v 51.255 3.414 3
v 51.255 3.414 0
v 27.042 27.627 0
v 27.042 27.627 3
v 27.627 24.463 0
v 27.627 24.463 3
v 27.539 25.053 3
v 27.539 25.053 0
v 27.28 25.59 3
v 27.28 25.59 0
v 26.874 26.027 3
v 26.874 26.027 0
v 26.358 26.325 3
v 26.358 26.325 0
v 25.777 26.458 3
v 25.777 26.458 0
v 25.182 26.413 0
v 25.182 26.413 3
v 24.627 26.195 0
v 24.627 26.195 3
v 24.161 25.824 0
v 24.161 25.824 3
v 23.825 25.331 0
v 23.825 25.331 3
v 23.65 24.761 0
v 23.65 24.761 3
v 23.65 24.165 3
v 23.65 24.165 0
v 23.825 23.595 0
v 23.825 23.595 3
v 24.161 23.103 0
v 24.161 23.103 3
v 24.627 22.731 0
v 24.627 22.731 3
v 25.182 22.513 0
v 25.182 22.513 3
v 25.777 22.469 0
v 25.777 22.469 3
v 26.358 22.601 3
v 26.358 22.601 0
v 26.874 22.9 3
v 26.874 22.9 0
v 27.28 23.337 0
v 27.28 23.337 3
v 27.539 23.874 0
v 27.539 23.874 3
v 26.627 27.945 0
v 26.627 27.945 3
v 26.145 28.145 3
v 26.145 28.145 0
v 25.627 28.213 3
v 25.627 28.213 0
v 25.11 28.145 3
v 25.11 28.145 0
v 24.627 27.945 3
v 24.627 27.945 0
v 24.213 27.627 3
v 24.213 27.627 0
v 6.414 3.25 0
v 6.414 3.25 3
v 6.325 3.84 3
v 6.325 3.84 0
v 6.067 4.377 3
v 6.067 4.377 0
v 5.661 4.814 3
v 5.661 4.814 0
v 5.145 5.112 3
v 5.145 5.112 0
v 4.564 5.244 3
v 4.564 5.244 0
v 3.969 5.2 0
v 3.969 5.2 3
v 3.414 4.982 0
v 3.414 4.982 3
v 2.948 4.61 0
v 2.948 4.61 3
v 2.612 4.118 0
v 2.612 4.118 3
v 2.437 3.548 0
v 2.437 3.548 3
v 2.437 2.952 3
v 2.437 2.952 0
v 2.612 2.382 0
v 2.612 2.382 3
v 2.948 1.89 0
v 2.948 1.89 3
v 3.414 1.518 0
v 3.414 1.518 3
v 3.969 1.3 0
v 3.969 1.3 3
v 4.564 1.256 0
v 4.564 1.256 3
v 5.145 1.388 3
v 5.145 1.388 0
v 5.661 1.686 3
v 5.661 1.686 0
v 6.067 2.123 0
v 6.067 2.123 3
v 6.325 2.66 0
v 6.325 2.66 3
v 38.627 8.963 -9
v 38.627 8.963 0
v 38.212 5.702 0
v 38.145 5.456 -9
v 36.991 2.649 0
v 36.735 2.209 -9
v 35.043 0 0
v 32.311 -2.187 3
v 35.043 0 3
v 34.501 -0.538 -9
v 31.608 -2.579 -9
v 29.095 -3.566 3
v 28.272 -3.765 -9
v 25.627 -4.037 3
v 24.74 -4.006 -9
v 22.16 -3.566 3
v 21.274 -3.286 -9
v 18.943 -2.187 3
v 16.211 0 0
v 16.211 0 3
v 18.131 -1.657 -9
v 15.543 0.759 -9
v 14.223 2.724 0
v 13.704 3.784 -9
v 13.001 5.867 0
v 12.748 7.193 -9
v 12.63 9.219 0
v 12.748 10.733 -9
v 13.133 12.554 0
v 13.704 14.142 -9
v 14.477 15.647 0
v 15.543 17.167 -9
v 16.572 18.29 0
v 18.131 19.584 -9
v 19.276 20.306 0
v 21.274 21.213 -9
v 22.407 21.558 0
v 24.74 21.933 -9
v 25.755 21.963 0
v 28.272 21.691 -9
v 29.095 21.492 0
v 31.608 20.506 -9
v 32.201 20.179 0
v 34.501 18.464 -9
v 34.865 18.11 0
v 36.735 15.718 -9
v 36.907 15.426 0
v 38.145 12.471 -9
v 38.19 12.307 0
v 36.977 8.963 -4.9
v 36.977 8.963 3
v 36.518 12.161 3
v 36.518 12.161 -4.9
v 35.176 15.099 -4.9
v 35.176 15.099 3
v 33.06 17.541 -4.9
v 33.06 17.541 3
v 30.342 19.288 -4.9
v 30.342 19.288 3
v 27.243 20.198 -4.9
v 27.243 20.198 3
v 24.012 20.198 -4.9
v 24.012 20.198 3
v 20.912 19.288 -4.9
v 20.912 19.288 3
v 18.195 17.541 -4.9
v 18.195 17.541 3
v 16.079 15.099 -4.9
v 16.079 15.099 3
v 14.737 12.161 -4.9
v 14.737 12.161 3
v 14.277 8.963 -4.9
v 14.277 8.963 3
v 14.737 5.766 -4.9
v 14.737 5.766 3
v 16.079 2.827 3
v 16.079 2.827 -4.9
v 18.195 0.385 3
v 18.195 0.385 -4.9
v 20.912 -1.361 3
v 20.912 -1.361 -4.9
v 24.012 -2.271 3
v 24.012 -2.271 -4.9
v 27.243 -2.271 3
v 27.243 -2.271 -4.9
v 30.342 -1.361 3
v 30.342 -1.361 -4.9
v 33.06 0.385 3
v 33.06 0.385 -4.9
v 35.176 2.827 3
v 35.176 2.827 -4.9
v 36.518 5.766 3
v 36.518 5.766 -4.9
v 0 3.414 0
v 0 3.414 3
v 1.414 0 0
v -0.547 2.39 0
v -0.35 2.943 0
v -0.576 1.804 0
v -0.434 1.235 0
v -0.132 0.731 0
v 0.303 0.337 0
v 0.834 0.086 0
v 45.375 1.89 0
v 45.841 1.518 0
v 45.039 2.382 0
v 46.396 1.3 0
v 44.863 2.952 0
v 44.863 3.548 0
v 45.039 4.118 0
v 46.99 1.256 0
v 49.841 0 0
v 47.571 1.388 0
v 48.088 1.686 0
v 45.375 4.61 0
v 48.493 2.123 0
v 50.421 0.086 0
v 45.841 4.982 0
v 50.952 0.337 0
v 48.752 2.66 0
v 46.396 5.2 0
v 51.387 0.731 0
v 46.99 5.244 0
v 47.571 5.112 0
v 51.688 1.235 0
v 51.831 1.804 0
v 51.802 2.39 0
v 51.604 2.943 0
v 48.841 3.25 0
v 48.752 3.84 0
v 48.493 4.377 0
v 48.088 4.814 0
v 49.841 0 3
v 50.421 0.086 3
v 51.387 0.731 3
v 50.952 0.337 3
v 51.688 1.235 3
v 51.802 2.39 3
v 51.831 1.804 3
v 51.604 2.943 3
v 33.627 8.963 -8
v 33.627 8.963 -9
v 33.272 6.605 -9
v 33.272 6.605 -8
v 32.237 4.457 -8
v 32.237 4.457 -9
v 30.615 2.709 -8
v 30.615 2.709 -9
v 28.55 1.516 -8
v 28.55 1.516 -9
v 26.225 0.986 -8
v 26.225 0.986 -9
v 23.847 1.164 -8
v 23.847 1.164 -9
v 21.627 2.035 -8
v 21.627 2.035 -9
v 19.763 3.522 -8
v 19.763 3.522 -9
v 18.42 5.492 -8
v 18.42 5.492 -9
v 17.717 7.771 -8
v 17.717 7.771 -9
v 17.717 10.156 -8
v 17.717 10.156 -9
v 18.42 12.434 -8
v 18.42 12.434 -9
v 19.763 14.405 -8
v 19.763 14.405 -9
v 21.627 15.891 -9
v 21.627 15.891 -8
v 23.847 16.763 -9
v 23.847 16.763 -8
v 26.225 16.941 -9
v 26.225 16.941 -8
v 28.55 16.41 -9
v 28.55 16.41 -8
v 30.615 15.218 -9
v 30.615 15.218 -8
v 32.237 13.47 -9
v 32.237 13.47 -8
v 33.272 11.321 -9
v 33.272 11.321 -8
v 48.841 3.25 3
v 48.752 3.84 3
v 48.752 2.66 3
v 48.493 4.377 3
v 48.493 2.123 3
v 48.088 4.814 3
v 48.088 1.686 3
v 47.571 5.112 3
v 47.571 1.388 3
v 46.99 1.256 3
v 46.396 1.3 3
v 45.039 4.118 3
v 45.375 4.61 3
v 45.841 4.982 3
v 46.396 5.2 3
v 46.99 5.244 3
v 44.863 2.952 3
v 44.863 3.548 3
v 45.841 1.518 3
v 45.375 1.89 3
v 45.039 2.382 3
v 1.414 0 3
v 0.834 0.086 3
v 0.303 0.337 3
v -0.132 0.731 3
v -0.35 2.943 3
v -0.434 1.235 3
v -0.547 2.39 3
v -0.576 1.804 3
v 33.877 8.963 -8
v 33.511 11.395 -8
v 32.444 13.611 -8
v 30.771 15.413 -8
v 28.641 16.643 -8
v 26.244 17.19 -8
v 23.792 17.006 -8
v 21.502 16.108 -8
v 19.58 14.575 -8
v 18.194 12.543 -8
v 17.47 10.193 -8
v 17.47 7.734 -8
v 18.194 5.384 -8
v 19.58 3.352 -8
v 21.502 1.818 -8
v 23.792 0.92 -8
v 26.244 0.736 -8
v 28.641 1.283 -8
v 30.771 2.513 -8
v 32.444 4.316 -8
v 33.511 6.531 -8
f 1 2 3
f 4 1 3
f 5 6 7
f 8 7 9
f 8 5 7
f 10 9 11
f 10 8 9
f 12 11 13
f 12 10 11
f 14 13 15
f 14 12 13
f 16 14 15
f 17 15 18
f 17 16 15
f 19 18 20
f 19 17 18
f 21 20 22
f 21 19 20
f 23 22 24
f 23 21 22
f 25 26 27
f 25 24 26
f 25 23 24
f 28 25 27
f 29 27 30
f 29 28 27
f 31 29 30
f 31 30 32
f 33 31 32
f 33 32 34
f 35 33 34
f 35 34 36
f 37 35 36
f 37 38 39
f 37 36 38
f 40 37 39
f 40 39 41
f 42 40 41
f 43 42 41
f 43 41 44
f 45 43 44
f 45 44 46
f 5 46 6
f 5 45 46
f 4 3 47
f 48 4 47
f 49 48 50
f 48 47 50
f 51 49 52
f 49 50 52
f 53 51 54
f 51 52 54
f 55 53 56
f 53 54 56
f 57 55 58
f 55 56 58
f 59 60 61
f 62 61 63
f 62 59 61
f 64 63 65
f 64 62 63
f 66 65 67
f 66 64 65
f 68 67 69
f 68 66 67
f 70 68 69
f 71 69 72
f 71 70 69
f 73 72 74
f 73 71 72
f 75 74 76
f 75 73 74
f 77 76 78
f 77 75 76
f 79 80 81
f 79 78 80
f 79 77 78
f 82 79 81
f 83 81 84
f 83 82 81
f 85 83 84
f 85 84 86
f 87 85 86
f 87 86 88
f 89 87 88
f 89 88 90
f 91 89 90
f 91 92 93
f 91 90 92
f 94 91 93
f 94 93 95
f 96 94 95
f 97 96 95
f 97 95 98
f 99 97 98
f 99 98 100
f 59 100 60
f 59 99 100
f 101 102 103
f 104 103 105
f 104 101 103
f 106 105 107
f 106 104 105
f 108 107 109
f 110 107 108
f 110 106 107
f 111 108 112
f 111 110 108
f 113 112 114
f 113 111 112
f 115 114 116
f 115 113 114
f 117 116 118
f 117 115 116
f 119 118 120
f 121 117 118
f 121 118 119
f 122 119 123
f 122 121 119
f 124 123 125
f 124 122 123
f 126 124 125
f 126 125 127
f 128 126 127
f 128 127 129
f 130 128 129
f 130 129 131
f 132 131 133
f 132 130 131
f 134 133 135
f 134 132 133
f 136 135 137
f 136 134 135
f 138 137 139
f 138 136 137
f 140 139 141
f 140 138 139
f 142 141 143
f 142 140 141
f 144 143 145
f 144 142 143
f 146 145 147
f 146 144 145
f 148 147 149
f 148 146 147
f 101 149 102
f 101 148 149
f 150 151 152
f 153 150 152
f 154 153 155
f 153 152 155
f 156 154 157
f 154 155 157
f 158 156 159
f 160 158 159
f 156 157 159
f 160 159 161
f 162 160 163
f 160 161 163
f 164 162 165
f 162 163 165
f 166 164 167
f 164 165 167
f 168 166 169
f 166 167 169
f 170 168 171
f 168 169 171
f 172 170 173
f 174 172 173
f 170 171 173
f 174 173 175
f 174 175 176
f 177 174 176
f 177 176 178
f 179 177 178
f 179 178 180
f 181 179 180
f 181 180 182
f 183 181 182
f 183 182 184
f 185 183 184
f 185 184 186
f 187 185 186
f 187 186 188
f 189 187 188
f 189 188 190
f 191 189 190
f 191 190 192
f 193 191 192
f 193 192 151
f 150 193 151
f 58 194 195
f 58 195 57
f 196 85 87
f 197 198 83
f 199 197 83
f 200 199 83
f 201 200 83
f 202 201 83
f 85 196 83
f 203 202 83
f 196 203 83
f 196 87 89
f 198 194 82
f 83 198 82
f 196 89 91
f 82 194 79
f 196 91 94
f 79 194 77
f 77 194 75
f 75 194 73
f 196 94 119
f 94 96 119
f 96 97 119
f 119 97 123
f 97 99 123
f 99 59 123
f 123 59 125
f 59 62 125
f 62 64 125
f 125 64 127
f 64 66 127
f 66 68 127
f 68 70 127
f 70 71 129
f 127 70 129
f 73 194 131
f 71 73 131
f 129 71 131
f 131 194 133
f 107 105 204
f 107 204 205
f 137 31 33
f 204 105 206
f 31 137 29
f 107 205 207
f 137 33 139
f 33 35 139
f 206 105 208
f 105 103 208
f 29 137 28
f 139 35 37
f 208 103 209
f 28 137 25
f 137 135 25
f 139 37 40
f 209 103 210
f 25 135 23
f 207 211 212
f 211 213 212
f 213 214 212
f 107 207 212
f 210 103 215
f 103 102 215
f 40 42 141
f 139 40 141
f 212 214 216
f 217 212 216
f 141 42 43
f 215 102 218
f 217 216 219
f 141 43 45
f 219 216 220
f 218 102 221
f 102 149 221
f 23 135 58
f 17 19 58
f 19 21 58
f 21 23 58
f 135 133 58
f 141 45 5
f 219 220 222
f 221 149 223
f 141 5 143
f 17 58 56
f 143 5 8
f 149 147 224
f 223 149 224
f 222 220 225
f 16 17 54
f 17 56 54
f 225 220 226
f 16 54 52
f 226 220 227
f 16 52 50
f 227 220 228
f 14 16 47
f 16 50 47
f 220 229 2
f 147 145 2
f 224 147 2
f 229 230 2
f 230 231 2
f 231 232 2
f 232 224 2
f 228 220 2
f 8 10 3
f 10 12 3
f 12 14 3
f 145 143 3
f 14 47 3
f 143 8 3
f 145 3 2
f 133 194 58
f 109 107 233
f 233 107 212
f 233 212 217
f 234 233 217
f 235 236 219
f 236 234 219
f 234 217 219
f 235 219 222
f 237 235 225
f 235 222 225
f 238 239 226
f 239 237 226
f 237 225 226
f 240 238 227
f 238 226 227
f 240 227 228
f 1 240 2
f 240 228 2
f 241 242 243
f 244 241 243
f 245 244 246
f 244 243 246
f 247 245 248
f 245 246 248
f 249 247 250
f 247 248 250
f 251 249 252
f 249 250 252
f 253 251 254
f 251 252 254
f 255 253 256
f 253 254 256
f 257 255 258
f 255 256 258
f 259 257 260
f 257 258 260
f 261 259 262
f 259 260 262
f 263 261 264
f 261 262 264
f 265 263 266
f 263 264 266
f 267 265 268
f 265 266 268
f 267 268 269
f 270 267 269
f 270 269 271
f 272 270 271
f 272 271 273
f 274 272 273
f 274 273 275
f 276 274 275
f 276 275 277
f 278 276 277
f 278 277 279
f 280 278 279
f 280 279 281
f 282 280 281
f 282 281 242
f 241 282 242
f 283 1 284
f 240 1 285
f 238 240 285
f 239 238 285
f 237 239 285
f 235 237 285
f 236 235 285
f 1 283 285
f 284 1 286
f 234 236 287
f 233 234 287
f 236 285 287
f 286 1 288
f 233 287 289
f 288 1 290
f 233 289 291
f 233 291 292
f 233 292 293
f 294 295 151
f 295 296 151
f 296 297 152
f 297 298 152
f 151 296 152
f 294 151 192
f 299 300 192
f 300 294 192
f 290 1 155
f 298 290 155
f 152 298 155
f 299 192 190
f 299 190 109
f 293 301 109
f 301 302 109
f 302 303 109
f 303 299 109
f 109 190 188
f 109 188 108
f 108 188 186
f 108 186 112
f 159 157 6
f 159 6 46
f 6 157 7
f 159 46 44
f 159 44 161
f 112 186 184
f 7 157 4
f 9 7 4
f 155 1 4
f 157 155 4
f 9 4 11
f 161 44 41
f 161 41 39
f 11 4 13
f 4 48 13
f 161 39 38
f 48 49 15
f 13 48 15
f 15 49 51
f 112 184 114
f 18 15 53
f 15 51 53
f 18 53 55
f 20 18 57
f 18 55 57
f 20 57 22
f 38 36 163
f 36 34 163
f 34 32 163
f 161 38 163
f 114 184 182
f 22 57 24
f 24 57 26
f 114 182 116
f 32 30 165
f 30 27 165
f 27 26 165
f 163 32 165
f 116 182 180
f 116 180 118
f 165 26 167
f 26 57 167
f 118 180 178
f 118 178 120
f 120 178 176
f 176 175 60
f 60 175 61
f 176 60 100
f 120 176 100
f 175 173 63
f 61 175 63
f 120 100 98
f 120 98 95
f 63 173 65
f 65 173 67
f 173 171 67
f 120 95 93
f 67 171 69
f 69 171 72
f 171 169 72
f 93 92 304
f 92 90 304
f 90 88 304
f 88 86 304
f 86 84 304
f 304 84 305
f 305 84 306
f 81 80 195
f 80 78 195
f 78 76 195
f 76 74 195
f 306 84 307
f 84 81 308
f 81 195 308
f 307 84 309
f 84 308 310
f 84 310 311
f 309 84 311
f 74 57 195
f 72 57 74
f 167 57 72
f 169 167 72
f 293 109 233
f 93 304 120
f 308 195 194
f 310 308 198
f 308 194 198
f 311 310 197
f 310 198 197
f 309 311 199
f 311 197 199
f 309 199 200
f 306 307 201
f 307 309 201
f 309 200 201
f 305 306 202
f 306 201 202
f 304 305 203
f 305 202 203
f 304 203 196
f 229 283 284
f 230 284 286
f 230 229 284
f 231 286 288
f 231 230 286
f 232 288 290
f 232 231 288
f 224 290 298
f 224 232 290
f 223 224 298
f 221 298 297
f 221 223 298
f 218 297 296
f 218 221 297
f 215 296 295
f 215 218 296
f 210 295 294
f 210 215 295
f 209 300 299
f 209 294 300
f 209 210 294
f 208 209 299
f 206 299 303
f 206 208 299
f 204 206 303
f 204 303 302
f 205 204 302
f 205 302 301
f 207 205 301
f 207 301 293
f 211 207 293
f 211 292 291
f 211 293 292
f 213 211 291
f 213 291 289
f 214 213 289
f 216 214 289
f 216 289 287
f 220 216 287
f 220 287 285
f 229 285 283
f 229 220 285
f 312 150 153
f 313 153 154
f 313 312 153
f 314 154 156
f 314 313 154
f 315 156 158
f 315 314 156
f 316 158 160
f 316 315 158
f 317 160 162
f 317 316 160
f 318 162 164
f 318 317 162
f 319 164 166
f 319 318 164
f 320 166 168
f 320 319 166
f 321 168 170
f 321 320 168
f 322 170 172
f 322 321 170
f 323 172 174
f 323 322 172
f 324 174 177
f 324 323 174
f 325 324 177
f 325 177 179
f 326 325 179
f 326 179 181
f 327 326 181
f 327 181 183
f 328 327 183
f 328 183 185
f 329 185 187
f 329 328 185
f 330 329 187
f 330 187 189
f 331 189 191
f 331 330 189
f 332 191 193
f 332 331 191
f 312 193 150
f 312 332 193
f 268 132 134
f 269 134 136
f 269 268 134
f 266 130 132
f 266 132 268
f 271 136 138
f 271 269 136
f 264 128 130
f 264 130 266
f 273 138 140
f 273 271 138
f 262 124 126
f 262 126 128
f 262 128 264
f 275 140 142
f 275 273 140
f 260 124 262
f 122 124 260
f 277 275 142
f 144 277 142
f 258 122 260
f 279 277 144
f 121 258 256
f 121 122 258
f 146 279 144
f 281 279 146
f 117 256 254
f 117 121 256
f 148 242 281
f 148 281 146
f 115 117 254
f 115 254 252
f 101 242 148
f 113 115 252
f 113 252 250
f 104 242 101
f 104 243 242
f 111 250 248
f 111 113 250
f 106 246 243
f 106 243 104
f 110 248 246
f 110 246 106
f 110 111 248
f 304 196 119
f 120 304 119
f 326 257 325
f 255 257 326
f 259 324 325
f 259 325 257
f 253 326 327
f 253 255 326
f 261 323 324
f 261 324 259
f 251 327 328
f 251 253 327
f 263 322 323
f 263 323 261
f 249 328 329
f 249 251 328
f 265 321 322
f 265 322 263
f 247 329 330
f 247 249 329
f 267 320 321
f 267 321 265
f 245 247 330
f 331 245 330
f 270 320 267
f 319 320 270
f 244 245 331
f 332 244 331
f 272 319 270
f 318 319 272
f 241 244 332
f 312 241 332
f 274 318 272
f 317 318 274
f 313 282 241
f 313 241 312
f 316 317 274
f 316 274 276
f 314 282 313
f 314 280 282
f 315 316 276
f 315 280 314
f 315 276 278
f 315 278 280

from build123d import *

# Parameters (mm, degrees)
SKETCH_R        = 2
PAD_DEPTH       = 5
SKETCH001_R     = 13
PAD001_DEPTH    = 9
SKETCH002_R     = 8
POCKET_DEPTH    = 18.001
SKETCH003_W     = 37.242641
SKETCH003_H     = 5
POCKET001_DEPTH = 41.926514
SKETCH004_R     = 11.35
POCKET002_DEPTH = 13
CHAMFER_SIZE    = 3.1
SKETCH005_W     = 40
SKETCH005_H     = 4
POCKET003_DEPTH = 41.926514


with BuildPart() as part:
    # Sketch → Pad (new body)
    with BuildSketch(Plane.XY):
        with BuildLine():
            Line((1.414214, 0), (49.84062, 0))
            ThreePointArc((49.84062, 0), (51.688379, 1.234633), (51.254834, 3.414214))
            Line((51.254834, 3.414214), (27.041631, 27.627417))
            ThreePointArc((27.041631, 27.627417), (25.627417, 28.213203), (24.213203, 27.627417))
            Line((0, 3.414214), (24.213203, 27.627417))
            ThreePointArc((0, 3.414214), (-0.433546, 1.234633), (1.414214, 0))
        make_face()
        with Locations((4.414214, 3.25)):
            Circle(SKETCH_R, mode=Mode.SUBTRACT)
        with Locations((46.84062, 3.25)):
            Circle(SKETCH_R, mode=Mode.SUBTRACT)
        with Locations((25.627417, 24.463203)):
            Circle(SKETCH_R, mode=Mode.SUBTRACT)
    extrude(amount=PAD_DEPTH)

    # Sketch001 (on Face10 of Pad) → Pad001 (join, symmetric)
    with BuildSketch(Plane(origin=(0, 0, 0), x_dir=(1, 0, 0), z_dir=(0, 0, -1))):
        with Locations((25.627417, -8.963203)):
            Circle(SKETCH001_R)
    extrude(amount=PAD001_DEPTH, both=True)

    # Sketch002 (on Face15 of Pad001) → Pocket (cut, through all)
    with BuildSketch(Plane(origin=(0, 0, -9), x_dir=(1, 0, 0), z_dir=(0, 0, -1))):
        with Locations((25.627417, -8.963203)):
            Circle(SKETCH002_R)
    extrude(amount=-POCKET_DEPTH, mode=Mode.SUBTRACT)

    # Sketch003 (on Face8 of Pocket) → Pocket001 (cut, through all)
    with BuildSketch(Plane(origin=(27.334524, 27.334524, 0), x_dir=(-0.707107, 0.707107, 0), z_dir=(0.707107, 0.707107, 0))):
        with Locations((-15.207106, 7.5)):
            Rectangle(SKETCH003_W, SKETCH003_H)
    extrude(amount=-POCKET001_DEPTH, mode=Mode.SUBTRACT)

    # Sketch004 (on Face15 of Pocket001) → Pocket002 (cut)
    with BuildSketch(Plane.XY.offset(5)):
        with Locations((25.627417, 8.963203)):
            Circle(SKETCH004_R)
    extrude(amount=-POCKET002_DEPTH, mode=Mode.SUBTRACT)

    # Chamfer
    chamfer_edges = [part.edges().sort_by_distance(p)[0] for p in [
        (14.277417, 8.963203, -8),
    ]]
    chamfer(chamfer_edges, length=CHAMFER_SIZE)

    # Sketch005 (on Face12 of Chamfer) → Pocket003 (cut, through all)
    with BuildSketch(Plane(origin=(-1.707107, 1.707107, 0), x_dir=(-0.707107, -0.707107, 0), z_dir=(-0.707107, 0.707107, 0))):
        with Locations((-20, 5)):
            Rectangle(SKETCH005_W, SKETCH005_H)
    extrude(amount=-POCKET003_DEPTH, mode=Mode.SUBTRACT)


solid = part.part
